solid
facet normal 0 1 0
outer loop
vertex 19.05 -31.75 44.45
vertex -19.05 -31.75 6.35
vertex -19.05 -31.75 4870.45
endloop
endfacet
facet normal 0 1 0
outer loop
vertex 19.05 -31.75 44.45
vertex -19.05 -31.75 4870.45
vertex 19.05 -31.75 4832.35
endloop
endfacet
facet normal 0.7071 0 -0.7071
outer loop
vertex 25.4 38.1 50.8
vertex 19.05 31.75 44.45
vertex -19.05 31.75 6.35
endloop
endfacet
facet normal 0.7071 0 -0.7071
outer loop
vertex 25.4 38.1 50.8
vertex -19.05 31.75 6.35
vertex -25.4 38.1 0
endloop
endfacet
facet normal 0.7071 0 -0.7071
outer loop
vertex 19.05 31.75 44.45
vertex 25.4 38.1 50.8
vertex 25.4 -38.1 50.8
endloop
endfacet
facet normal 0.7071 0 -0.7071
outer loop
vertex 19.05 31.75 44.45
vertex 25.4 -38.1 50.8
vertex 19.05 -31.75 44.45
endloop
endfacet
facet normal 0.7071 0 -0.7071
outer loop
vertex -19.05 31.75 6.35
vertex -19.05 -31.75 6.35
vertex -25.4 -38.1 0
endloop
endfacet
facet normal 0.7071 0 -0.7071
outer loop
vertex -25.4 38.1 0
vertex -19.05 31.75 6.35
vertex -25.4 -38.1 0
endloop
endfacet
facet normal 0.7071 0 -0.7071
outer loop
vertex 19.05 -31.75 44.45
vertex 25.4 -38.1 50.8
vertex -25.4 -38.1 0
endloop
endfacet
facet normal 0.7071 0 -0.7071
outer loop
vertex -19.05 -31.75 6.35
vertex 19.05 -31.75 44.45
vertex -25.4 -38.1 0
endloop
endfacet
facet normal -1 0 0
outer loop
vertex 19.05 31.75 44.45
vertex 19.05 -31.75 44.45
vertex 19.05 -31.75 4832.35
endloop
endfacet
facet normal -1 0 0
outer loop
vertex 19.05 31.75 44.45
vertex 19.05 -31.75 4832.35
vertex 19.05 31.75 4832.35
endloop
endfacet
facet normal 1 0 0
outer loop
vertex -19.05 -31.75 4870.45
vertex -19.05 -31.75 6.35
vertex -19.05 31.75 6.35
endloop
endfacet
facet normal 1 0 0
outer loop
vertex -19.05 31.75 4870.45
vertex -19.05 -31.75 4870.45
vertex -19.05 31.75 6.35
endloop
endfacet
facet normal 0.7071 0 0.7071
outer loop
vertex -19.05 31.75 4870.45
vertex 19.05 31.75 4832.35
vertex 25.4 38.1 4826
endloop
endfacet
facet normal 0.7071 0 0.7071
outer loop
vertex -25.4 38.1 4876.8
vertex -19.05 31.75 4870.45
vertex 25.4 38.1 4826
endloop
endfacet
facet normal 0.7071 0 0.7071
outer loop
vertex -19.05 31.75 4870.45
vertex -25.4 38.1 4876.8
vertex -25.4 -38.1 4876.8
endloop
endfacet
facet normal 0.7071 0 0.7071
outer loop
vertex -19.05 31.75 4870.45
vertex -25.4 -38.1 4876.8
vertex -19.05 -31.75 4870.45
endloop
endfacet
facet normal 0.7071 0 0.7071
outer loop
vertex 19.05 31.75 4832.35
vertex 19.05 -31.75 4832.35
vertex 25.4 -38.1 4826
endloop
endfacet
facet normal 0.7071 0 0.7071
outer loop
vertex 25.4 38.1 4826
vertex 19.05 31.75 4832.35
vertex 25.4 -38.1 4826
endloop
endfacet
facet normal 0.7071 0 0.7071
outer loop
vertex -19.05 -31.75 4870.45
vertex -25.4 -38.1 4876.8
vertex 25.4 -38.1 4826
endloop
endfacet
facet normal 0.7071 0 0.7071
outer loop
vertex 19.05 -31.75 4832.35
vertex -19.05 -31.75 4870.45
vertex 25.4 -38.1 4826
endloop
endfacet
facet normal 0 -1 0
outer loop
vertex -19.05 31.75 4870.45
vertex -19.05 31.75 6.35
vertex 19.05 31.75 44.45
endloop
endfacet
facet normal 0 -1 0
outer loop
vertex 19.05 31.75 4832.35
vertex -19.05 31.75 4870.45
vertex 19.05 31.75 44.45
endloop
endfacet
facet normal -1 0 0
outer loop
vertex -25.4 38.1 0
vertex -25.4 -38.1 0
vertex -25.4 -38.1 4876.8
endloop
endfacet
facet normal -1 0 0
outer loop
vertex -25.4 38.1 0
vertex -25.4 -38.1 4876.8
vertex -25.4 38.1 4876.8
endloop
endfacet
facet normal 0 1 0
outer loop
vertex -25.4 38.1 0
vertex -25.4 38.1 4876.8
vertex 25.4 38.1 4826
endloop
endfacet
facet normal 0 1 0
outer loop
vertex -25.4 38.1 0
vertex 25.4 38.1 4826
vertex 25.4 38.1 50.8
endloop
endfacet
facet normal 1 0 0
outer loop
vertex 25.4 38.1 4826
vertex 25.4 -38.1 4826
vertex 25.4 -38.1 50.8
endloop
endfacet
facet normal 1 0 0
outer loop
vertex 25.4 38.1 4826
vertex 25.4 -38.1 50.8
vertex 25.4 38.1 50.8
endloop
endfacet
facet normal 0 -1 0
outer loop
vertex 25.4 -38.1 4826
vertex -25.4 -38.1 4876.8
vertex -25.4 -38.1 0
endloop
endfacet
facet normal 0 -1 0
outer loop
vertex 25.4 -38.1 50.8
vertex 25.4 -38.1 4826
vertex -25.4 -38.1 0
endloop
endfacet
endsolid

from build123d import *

# Parameters (mm, degrees)
F0_W     = 50.8
F0_H     = 76.2
F0_W_2   = 38.100002
F0_H_2   = 63.500002
F1_DEPTH = 4876.8
F3_DEPTH = 76.2


with BuildPart() as f1:
    # F0 (on Top) → F1 (new body)
    with BuildSketch(Plane.XY):
        Rectangle(F0_W, F0_H)
        Rectangle(F0_W_2, F0_H_2, mode=Mode.SUBTRACT)
    extrude(amount=F1_DEPTH)

    # F2 (on face) → F3 (cut)
    with BuildSketch(Plane.XZ.offset(38.1)):
        Polygon((25.4, 50.8), (-25.4, 0), (25.4, 0), align=None)
        Polygon((25.4, 4876.8), (-25.4, 4876.8), (25.4, 4826), align=None)
    extrude(amount=-F3_DEPTH, mode=Mode.SUBTRACT)


solid = f1.part
